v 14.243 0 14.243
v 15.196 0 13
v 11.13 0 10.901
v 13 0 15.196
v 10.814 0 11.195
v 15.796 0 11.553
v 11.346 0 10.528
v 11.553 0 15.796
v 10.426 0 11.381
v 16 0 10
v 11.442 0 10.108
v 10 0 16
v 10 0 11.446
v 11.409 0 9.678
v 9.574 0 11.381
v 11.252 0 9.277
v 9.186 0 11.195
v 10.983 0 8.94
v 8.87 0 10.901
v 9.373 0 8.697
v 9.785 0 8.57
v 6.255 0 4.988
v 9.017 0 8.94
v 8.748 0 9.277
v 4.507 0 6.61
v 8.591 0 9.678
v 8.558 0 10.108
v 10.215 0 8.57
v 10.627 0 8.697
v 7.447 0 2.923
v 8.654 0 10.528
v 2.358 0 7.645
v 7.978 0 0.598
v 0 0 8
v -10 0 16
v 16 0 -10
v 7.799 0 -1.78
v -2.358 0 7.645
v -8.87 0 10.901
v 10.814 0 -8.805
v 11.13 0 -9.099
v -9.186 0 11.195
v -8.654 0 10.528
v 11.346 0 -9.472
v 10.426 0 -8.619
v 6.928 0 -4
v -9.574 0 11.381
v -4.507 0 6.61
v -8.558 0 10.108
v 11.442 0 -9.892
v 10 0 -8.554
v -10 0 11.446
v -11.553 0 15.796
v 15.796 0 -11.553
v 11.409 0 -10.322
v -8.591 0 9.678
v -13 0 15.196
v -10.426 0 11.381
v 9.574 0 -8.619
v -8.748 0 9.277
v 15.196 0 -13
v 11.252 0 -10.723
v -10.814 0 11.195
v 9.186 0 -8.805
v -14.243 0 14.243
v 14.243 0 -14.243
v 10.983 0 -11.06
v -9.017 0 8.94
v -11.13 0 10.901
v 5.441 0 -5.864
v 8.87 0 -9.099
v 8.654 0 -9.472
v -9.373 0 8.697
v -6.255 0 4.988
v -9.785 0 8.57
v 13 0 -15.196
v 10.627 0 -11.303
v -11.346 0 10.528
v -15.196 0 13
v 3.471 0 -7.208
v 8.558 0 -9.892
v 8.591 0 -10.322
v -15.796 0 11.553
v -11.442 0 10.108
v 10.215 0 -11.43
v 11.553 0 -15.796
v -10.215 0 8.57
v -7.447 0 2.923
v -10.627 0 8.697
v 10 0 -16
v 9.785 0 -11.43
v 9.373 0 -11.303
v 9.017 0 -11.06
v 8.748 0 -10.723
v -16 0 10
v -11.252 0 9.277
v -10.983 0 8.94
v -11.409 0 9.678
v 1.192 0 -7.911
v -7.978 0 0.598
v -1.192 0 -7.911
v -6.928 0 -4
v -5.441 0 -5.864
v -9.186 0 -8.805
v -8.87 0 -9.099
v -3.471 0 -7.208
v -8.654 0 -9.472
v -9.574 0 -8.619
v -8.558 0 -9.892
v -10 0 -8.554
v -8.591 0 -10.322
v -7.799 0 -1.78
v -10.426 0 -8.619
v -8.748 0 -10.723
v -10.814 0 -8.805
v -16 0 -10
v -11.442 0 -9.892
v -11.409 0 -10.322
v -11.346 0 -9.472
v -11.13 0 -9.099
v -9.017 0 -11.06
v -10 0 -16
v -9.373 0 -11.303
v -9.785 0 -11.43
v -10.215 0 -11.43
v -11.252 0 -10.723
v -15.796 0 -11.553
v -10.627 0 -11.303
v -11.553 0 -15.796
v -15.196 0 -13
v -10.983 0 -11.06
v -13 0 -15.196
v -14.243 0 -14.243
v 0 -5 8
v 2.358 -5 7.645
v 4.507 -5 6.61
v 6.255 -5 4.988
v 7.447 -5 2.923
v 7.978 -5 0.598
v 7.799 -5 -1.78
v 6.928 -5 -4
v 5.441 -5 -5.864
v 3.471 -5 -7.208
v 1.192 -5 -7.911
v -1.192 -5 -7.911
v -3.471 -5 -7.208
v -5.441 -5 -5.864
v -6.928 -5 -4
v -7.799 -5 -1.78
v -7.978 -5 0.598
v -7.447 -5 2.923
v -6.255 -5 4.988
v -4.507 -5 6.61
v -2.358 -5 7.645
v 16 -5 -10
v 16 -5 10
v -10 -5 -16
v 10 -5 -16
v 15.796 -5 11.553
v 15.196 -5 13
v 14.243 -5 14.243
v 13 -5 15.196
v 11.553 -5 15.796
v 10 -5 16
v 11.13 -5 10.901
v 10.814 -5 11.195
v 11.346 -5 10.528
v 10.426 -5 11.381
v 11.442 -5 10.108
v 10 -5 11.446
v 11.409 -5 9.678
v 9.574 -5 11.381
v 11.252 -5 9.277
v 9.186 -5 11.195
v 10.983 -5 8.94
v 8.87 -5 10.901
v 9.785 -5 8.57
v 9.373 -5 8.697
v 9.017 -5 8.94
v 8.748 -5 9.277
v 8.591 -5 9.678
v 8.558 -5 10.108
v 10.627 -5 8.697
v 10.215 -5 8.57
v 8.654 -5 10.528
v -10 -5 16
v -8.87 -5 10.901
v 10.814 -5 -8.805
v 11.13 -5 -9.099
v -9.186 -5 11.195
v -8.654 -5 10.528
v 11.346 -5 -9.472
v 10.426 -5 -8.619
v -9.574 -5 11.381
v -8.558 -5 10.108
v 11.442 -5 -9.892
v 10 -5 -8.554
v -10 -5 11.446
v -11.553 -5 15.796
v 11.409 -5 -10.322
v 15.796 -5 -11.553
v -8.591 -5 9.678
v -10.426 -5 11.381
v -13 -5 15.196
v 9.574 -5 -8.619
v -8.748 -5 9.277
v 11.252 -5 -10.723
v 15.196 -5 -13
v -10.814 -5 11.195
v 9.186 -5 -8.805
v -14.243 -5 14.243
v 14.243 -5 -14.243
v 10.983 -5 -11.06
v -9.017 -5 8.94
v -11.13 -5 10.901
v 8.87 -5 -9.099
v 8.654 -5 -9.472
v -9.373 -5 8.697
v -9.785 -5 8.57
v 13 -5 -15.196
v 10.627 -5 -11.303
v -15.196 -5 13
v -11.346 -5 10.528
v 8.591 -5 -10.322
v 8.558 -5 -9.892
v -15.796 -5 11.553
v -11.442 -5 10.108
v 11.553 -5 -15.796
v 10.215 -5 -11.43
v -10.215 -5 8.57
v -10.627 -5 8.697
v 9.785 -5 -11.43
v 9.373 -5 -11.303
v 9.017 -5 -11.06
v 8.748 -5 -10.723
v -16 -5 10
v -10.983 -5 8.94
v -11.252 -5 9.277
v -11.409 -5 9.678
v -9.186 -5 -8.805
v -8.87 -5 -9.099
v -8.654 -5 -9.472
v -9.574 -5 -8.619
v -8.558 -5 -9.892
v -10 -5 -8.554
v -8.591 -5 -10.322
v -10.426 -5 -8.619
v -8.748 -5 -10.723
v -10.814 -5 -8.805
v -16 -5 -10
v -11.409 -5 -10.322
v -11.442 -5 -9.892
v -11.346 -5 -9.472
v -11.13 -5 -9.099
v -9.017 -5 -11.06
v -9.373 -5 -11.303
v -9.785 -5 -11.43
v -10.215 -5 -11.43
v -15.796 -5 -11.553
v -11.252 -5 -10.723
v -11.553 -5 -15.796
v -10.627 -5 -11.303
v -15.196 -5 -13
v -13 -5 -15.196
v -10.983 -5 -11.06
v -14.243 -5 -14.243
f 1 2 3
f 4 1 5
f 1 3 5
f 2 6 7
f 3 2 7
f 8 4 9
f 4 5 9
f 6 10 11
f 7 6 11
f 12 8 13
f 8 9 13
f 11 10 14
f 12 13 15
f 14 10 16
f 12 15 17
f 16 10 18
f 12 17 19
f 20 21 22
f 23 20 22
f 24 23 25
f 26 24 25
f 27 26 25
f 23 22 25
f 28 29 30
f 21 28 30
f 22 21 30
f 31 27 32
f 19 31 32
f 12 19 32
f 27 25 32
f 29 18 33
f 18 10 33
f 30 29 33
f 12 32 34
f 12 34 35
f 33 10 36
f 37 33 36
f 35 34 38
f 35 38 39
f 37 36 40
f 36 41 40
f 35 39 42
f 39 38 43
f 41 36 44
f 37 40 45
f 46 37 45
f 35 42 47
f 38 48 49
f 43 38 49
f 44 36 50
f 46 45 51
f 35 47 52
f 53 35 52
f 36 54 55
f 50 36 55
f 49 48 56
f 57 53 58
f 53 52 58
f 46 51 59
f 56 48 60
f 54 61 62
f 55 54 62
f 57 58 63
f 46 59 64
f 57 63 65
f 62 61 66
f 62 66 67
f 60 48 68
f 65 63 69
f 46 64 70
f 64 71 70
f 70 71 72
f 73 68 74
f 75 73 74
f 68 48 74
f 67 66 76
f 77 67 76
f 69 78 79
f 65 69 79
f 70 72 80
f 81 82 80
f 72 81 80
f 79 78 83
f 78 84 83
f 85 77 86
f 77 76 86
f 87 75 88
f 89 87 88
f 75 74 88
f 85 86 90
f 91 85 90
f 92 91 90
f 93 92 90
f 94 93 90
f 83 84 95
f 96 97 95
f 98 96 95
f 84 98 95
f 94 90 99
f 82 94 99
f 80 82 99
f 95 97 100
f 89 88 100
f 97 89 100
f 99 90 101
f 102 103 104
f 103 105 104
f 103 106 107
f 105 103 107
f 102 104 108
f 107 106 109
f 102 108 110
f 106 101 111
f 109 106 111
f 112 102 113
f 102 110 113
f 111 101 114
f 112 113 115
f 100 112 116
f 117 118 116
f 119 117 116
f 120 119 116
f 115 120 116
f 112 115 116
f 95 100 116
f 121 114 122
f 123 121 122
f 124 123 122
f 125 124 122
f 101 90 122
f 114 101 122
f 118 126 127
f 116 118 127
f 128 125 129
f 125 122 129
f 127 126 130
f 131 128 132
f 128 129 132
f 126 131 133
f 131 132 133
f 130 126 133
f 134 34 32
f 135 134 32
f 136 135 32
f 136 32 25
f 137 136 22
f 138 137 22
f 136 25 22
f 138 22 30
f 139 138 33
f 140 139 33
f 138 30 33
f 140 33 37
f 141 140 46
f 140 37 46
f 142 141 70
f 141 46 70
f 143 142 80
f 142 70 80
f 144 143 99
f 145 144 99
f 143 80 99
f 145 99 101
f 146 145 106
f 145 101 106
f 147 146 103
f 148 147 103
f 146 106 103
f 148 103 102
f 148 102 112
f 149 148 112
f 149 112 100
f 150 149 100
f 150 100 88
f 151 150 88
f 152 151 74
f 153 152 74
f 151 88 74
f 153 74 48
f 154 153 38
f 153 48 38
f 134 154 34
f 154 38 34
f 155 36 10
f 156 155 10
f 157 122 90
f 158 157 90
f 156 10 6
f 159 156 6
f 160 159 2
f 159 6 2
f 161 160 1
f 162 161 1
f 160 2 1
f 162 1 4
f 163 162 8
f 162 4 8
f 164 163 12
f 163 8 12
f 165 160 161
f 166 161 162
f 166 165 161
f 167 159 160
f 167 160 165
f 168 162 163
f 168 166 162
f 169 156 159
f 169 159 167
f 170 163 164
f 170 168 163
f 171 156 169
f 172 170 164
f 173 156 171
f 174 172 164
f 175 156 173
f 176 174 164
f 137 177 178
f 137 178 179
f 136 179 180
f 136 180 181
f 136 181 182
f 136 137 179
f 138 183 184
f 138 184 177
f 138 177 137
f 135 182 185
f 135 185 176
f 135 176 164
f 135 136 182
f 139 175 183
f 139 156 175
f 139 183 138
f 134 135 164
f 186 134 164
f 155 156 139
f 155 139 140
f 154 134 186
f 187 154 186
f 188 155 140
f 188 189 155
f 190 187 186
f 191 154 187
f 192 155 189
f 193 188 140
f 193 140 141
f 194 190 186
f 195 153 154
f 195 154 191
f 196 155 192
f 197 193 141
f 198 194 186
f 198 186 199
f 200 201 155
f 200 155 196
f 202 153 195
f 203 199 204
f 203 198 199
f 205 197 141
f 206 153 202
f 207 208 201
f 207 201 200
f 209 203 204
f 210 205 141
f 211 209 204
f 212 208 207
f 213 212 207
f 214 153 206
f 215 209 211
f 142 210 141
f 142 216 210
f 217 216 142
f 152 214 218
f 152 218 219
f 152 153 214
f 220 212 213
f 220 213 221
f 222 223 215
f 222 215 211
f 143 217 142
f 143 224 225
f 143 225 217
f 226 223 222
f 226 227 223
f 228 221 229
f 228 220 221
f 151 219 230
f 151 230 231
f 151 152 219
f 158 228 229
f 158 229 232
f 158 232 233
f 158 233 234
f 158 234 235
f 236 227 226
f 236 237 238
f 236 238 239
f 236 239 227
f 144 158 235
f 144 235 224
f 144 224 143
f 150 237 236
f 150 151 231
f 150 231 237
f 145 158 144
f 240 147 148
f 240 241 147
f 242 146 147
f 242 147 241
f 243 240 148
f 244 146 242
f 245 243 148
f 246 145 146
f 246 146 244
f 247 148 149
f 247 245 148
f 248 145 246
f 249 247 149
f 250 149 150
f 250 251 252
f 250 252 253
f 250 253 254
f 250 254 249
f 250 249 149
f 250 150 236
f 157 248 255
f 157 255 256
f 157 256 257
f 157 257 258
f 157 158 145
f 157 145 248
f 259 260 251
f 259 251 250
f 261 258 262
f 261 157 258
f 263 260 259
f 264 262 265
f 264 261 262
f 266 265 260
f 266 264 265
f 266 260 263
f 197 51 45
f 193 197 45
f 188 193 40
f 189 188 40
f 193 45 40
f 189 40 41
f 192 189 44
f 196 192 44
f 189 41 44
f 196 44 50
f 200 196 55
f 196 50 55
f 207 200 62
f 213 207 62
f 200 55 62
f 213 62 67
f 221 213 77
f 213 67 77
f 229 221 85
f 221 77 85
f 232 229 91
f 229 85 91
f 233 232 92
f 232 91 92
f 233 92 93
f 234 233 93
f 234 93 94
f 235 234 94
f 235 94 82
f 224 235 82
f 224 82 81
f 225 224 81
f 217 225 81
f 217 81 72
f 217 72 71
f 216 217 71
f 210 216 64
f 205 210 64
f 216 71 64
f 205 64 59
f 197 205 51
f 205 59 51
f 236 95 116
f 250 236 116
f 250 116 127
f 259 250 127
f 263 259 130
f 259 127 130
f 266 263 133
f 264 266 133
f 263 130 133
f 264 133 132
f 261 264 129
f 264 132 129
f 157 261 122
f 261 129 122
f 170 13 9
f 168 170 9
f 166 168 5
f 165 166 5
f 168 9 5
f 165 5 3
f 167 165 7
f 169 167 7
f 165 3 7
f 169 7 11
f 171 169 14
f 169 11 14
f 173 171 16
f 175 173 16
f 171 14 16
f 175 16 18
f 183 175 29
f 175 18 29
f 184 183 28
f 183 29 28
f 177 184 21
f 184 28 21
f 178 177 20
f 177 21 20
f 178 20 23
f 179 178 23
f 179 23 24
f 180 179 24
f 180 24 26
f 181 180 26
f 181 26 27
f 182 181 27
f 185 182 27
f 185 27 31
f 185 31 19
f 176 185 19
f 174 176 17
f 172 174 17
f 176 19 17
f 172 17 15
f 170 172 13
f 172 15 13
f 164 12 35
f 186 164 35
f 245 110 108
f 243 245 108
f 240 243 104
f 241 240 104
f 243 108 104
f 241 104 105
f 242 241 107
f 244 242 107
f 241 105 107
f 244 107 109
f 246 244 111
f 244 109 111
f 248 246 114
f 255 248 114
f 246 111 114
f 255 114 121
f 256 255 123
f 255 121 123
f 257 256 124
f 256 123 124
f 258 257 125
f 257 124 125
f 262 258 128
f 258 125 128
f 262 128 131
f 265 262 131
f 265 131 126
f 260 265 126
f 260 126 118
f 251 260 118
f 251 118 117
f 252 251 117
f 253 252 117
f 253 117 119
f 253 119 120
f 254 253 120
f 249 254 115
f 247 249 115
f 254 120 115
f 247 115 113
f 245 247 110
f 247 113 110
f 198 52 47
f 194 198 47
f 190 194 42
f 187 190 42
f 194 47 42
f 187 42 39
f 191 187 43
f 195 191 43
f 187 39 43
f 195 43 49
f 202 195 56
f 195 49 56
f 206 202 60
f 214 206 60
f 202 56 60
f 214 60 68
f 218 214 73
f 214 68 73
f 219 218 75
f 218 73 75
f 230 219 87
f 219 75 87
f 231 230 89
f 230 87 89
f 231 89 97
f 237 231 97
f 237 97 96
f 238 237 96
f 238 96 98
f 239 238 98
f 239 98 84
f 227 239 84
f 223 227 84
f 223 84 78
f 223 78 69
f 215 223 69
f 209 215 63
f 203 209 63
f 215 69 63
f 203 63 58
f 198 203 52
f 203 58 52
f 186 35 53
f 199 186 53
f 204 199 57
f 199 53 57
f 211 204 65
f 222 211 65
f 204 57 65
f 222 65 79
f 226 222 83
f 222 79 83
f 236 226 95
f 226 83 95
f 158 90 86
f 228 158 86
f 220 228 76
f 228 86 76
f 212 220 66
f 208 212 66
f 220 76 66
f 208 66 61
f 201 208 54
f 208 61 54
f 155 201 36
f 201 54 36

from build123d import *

# Parameters (mm, degrees)
SKETCH1_R           = 8
SKETCH1_R_2         = 1.445711851
BOSS_EXTRUDE1_DEPTH = 5


with BuildPart() as part:
    # Sketch1 → Boss-Extrude1 (new body)
    with BuildSketch(Plane(origin=(0, 0, 0), x_dir=(1, 0, 0), z_dir=(0, 1, 0))):
        with BuildLine():
            Line((-10, 16), (10, 16))
            ThreePointArc((10, 16), (14.242640687, 14.242640687), (16, 10))
            Line((16, 10), (16, -10))
            ThreePointArc((16, -10), (14.242640687, -14.242640687), (10, -16))
            Line((10, -16), (-10, -16))
            ThreePointArc((-10, -16), (-14.242640687, -14.242640687), (-16, -10))
            Line((-16, -10), (-16, 10))
            ThreePointArc((-16, 10), (-14.242640687, 14.242640687), (-10, 16))
        make_face()
        with Locations(Location((0, 0, 0), (0, 0, 270))):
            Circle(SKETCH1_R, mode=Mode.SUBTRACT)
        with Locations(Location((-10, 10, 0), (0, 0, 270))):
            Circle(SKETCH1_R_2, mode=Mode.SUBTRACT)
        with Locations(Location((10, 10, 0), (0, 0, 270))):
            Circle(SKETCH1_R_2, mode=Mode.SUBTRACT)
        with Locations(Location((10, -10, 0), (0, 0, 270))):
            Circle(SKETCH1_R_2, mode=Mode.SUBTRACT)
        with Locations(Location((-10, -10, 0), (0, 0, 270))):
            Circle(SKETCH1_R_2, mode=Mode.SUBTRACT)
    extrude(amount=-BOSS_EXTRUDE1_DEPTH)


solid = part.part
